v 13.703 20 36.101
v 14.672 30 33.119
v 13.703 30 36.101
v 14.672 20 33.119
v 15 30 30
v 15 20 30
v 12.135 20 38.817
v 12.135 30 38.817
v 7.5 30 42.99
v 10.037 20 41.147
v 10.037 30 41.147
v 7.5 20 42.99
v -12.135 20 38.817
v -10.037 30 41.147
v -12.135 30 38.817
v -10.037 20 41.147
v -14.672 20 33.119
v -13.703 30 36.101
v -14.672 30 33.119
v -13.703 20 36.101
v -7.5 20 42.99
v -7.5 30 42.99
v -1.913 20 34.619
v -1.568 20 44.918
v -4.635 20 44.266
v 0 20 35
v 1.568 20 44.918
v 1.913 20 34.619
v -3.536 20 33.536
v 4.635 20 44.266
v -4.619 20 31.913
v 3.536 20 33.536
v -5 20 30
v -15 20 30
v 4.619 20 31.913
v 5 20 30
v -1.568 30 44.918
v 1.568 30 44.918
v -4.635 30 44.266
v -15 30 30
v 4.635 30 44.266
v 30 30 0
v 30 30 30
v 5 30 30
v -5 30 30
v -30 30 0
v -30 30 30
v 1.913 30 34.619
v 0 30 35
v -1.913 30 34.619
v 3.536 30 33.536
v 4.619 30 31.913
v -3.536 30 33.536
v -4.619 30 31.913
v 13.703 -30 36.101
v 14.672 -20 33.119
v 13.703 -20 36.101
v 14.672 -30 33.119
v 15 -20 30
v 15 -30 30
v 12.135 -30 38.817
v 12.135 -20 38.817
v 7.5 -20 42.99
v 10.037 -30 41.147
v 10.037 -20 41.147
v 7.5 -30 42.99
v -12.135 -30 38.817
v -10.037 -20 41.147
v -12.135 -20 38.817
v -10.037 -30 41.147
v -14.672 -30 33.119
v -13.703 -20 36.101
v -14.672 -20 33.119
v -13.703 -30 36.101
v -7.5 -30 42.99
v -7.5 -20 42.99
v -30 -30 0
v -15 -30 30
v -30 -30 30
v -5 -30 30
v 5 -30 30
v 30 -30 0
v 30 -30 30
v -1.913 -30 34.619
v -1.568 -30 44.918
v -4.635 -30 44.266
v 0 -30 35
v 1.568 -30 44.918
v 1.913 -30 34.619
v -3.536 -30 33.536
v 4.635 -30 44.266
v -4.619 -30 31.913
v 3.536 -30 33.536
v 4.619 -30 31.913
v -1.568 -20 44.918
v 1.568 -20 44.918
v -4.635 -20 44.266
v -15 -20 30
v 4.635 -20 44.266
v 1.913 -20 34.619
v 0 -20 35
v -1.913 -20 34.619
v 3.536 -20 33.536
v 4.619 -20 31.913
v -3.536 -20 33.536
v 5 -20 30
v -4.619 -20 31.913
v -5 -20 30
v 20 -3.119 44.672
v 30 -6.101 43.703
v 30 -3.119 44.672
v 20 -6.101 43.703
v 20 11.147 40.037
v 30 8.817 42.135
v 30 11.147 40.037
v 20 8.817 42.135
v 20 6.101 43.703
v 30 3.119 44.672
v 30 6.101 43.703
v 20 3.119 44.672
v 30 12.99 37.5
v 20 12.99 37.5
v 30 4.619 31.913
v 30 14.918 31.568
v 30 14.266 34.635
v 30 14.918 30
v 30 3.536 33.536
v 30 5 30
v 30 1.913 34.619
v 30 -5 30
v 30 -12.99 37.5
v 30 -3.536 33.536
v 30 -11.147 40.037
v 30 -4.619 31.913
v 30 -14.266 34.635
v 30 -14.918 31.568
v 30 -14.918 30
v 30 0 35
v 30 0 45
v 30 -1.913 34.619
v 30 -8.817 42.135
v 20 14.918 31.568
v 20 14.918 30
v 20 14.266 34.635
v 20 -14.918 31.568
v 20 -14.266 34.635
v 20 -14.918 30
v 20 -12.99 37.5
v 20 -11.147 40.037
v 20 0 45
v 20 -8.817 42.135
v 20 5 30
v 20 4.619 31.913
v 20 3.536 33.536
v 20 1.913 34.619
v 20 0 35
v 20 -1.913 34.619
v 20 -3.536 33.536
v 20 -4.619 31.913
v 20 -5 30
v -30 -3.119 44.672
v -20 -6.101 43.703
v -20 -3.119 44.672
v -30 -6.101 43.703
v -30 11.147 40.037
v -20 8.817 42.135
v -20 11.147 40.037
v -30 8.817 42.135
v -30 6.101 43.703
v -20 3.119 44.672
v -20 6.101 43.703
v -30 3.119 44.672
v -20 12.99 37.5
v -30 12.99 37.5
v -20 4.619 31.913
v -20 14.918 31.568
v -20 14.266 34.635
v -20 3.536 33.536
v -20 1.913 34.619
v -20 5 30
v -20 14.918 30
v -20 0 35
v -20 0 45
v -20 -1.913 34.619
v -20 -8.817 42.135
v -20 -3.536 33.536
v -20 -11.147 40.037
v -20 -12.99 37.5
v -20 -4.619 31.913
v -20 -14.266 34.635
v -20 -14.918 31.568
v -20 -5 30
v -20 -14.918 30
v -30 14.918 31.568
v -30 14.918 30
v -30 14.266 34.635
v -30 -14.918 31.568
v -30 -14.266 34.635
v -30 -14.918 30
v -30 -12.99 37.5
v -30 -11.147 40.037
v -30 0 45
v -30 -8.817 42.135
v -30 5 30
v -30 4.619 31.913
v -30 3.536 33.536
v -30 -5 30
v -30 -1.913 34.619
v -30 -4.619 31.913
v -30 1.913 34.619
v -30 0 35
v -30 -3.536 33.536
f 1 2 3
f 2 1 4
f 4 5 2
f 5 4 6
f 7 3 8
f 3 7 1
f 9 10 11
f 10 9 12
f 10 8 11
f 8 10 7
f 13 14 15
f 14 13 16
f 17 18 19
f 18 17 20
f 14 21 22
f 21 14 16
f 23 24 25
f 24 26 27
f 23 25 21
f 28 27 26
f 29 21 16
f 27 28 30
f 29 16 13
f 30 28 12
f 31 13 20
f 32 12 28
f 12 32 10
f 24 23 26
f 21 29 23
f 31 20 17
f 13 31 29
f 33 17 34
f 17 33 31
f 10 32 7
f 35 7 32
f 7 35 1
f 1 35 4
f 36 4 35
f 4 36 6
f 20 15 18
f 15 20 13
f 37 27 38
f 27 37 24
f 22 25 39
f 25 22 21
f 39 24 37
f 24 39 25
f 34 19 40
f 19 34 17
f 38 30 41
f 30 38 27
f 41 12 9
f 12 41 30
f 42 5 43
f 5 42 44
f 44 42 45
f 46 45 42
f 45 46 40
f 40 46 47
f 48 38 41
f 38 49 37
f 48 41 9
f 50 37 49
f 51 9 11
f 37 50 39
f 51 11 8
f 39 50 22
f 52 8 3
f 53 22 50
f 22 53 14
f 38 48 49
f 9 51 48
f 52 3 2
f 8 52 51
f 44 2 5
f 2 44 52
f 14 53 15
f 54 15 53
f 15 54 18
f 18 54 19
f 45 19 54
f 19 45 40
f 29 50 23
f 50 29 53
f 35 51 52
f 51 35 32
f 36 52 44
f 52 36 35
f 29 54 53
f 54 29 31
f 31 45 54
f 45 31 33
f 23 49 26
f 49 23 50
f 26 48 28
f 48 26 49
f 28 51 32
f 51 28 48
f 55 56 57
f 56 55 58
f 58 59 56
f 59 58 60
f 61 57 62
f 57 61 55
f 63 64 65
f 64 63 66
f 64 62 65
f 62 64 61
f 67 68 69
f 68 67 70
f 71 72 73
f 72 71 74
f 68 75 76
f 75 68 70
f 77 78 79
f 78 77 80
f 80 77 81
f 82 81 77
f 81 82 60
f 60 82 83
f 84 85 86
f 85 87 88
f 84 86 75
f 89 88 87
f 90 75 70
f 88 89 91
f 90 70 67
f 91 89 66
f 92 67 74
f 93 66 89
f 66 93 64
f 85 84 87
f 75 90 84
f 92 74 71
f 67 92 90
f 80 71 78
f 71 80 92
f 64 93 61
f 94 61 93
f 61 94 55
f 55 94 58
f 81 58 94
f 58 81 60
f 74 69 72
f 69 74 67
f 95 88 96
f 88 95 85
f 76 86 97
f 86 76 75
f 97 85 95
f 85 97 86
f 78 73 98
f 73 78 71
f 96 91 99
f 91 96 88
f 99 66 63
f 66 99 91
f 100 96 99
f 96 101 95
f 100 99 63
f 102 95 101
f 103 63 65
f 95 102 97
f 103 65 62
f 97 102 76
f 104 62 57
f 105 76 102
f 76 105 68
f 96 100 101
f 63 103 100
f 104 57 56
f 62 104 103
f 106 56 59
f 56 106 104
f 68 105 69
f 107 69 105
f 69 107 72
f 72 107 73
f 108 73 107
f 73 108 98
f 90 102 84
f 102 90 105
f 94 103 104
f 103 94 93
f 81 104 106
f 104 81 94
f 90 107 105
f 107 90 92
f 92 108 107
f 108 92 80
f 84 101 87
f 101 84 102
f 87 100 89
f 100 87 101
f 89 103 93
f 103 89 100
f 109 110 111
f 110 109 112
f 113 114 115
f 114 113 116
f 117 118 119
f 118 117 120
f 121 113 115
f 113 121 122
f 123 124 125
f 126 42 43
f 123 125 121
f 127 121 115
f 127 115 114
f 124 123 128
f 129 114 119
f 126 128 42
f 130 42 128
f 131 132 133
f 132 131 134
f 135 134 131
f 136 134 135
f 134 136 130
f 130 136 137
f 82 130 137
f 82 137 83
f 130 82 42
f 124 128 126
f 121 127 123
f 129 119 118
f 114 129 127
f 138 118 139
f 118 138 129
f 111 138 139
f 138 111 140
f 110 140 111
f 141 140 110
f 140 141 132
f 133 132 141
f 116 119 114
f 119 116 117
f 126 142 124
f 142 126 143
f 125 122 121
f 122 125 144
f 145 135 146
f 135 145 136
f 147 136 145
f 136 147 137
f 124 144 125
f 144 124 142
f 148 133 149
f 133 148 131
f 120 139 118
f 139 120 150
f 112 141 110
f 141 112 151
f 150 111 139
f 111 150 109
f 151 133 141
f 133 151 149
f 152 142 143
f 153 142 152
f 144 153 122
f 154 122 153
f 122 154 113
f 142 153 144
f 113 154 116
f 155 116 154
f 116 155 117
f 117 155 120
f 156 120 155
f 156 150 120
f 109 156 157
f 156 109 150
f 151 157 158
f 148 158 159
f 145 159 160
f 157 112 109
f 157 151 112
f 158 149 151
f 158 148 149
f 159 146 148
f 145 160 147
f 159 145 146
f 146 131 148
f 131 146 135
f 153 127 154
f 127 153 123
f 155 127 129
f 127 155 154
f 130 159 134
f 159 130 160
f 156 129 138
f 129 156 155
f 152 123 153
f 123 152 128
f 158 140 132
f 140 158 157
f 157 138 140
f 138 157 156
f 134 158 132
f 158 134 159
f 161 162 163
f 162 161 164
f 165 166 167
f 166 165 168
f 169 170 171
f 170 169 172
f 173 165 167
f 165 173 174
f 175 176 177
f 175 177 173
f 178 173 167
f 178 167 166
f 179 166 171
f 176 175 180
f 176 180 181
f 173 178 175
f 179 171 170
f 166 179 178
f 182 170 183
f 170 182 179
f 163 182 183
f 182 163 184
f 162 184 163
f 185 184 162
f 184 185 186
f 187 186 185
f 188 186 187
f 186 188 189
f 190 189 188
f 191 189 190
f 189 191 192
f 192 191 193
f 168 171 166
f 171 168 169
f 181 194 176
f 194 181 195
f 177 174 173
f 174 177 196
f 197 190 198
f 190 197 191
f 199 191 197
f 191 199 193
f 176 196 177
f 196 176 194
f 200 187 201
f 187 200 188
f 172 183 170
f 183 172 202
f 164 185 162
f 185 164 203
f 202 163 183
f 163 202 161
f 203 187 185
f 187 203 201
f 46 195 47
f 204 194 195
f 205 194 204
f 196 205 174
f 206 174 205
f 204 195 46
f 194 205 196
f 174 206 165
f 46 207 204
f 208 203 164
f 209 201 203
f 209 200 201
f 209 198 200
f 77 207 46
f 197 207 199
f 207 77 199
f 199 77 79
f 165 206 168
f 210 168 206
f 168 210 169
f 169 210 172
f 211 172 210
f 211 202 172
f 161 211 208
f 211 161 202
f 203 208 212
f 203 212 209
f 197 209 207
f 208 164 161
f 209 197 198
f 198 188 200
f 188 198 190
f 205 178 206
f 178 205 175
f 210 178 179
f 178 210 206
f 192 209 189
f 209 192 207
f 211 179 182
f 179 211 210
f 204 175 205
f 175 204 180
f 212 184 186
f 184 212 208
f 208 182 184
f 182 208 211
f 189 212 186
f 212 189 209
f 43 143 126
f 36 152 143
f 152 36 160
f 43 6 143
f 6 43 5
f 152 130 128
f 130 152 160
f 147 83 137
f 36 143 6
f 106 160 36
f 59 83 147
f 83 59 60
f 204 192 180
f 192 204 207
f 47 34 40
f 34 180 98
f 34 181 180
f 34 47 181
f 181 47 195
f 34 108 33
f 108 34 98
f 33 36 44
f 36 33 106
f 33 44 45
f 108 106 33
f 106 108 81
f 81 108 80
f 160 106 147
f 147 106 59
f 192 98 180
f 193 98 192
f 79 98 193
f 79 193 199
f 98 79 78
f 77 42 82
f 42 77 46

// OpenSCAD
module rtcy (r, t) {
    translate(t)
        rotate(90, r)
            translate ([0, 0, -5])
                difference() {
                    cylinder(h=10, r1=15, r2=15);
                    cylinder(h=10, r1= 5, r2= 5);
                }
}

union() {
    translate ([-30, -30, 0])
        cube([60, 60, 30]);
    rtcy ([1, 0, 0], [  0,  25,  30]);
    rtcy ([1, 0, 0], [  0, -25,  30]);
    rtcy ([0, 1, 0], [ 25,   0,  30]);
    rtcy ([0, 1, 0], [-25,   0,  30]);
}
